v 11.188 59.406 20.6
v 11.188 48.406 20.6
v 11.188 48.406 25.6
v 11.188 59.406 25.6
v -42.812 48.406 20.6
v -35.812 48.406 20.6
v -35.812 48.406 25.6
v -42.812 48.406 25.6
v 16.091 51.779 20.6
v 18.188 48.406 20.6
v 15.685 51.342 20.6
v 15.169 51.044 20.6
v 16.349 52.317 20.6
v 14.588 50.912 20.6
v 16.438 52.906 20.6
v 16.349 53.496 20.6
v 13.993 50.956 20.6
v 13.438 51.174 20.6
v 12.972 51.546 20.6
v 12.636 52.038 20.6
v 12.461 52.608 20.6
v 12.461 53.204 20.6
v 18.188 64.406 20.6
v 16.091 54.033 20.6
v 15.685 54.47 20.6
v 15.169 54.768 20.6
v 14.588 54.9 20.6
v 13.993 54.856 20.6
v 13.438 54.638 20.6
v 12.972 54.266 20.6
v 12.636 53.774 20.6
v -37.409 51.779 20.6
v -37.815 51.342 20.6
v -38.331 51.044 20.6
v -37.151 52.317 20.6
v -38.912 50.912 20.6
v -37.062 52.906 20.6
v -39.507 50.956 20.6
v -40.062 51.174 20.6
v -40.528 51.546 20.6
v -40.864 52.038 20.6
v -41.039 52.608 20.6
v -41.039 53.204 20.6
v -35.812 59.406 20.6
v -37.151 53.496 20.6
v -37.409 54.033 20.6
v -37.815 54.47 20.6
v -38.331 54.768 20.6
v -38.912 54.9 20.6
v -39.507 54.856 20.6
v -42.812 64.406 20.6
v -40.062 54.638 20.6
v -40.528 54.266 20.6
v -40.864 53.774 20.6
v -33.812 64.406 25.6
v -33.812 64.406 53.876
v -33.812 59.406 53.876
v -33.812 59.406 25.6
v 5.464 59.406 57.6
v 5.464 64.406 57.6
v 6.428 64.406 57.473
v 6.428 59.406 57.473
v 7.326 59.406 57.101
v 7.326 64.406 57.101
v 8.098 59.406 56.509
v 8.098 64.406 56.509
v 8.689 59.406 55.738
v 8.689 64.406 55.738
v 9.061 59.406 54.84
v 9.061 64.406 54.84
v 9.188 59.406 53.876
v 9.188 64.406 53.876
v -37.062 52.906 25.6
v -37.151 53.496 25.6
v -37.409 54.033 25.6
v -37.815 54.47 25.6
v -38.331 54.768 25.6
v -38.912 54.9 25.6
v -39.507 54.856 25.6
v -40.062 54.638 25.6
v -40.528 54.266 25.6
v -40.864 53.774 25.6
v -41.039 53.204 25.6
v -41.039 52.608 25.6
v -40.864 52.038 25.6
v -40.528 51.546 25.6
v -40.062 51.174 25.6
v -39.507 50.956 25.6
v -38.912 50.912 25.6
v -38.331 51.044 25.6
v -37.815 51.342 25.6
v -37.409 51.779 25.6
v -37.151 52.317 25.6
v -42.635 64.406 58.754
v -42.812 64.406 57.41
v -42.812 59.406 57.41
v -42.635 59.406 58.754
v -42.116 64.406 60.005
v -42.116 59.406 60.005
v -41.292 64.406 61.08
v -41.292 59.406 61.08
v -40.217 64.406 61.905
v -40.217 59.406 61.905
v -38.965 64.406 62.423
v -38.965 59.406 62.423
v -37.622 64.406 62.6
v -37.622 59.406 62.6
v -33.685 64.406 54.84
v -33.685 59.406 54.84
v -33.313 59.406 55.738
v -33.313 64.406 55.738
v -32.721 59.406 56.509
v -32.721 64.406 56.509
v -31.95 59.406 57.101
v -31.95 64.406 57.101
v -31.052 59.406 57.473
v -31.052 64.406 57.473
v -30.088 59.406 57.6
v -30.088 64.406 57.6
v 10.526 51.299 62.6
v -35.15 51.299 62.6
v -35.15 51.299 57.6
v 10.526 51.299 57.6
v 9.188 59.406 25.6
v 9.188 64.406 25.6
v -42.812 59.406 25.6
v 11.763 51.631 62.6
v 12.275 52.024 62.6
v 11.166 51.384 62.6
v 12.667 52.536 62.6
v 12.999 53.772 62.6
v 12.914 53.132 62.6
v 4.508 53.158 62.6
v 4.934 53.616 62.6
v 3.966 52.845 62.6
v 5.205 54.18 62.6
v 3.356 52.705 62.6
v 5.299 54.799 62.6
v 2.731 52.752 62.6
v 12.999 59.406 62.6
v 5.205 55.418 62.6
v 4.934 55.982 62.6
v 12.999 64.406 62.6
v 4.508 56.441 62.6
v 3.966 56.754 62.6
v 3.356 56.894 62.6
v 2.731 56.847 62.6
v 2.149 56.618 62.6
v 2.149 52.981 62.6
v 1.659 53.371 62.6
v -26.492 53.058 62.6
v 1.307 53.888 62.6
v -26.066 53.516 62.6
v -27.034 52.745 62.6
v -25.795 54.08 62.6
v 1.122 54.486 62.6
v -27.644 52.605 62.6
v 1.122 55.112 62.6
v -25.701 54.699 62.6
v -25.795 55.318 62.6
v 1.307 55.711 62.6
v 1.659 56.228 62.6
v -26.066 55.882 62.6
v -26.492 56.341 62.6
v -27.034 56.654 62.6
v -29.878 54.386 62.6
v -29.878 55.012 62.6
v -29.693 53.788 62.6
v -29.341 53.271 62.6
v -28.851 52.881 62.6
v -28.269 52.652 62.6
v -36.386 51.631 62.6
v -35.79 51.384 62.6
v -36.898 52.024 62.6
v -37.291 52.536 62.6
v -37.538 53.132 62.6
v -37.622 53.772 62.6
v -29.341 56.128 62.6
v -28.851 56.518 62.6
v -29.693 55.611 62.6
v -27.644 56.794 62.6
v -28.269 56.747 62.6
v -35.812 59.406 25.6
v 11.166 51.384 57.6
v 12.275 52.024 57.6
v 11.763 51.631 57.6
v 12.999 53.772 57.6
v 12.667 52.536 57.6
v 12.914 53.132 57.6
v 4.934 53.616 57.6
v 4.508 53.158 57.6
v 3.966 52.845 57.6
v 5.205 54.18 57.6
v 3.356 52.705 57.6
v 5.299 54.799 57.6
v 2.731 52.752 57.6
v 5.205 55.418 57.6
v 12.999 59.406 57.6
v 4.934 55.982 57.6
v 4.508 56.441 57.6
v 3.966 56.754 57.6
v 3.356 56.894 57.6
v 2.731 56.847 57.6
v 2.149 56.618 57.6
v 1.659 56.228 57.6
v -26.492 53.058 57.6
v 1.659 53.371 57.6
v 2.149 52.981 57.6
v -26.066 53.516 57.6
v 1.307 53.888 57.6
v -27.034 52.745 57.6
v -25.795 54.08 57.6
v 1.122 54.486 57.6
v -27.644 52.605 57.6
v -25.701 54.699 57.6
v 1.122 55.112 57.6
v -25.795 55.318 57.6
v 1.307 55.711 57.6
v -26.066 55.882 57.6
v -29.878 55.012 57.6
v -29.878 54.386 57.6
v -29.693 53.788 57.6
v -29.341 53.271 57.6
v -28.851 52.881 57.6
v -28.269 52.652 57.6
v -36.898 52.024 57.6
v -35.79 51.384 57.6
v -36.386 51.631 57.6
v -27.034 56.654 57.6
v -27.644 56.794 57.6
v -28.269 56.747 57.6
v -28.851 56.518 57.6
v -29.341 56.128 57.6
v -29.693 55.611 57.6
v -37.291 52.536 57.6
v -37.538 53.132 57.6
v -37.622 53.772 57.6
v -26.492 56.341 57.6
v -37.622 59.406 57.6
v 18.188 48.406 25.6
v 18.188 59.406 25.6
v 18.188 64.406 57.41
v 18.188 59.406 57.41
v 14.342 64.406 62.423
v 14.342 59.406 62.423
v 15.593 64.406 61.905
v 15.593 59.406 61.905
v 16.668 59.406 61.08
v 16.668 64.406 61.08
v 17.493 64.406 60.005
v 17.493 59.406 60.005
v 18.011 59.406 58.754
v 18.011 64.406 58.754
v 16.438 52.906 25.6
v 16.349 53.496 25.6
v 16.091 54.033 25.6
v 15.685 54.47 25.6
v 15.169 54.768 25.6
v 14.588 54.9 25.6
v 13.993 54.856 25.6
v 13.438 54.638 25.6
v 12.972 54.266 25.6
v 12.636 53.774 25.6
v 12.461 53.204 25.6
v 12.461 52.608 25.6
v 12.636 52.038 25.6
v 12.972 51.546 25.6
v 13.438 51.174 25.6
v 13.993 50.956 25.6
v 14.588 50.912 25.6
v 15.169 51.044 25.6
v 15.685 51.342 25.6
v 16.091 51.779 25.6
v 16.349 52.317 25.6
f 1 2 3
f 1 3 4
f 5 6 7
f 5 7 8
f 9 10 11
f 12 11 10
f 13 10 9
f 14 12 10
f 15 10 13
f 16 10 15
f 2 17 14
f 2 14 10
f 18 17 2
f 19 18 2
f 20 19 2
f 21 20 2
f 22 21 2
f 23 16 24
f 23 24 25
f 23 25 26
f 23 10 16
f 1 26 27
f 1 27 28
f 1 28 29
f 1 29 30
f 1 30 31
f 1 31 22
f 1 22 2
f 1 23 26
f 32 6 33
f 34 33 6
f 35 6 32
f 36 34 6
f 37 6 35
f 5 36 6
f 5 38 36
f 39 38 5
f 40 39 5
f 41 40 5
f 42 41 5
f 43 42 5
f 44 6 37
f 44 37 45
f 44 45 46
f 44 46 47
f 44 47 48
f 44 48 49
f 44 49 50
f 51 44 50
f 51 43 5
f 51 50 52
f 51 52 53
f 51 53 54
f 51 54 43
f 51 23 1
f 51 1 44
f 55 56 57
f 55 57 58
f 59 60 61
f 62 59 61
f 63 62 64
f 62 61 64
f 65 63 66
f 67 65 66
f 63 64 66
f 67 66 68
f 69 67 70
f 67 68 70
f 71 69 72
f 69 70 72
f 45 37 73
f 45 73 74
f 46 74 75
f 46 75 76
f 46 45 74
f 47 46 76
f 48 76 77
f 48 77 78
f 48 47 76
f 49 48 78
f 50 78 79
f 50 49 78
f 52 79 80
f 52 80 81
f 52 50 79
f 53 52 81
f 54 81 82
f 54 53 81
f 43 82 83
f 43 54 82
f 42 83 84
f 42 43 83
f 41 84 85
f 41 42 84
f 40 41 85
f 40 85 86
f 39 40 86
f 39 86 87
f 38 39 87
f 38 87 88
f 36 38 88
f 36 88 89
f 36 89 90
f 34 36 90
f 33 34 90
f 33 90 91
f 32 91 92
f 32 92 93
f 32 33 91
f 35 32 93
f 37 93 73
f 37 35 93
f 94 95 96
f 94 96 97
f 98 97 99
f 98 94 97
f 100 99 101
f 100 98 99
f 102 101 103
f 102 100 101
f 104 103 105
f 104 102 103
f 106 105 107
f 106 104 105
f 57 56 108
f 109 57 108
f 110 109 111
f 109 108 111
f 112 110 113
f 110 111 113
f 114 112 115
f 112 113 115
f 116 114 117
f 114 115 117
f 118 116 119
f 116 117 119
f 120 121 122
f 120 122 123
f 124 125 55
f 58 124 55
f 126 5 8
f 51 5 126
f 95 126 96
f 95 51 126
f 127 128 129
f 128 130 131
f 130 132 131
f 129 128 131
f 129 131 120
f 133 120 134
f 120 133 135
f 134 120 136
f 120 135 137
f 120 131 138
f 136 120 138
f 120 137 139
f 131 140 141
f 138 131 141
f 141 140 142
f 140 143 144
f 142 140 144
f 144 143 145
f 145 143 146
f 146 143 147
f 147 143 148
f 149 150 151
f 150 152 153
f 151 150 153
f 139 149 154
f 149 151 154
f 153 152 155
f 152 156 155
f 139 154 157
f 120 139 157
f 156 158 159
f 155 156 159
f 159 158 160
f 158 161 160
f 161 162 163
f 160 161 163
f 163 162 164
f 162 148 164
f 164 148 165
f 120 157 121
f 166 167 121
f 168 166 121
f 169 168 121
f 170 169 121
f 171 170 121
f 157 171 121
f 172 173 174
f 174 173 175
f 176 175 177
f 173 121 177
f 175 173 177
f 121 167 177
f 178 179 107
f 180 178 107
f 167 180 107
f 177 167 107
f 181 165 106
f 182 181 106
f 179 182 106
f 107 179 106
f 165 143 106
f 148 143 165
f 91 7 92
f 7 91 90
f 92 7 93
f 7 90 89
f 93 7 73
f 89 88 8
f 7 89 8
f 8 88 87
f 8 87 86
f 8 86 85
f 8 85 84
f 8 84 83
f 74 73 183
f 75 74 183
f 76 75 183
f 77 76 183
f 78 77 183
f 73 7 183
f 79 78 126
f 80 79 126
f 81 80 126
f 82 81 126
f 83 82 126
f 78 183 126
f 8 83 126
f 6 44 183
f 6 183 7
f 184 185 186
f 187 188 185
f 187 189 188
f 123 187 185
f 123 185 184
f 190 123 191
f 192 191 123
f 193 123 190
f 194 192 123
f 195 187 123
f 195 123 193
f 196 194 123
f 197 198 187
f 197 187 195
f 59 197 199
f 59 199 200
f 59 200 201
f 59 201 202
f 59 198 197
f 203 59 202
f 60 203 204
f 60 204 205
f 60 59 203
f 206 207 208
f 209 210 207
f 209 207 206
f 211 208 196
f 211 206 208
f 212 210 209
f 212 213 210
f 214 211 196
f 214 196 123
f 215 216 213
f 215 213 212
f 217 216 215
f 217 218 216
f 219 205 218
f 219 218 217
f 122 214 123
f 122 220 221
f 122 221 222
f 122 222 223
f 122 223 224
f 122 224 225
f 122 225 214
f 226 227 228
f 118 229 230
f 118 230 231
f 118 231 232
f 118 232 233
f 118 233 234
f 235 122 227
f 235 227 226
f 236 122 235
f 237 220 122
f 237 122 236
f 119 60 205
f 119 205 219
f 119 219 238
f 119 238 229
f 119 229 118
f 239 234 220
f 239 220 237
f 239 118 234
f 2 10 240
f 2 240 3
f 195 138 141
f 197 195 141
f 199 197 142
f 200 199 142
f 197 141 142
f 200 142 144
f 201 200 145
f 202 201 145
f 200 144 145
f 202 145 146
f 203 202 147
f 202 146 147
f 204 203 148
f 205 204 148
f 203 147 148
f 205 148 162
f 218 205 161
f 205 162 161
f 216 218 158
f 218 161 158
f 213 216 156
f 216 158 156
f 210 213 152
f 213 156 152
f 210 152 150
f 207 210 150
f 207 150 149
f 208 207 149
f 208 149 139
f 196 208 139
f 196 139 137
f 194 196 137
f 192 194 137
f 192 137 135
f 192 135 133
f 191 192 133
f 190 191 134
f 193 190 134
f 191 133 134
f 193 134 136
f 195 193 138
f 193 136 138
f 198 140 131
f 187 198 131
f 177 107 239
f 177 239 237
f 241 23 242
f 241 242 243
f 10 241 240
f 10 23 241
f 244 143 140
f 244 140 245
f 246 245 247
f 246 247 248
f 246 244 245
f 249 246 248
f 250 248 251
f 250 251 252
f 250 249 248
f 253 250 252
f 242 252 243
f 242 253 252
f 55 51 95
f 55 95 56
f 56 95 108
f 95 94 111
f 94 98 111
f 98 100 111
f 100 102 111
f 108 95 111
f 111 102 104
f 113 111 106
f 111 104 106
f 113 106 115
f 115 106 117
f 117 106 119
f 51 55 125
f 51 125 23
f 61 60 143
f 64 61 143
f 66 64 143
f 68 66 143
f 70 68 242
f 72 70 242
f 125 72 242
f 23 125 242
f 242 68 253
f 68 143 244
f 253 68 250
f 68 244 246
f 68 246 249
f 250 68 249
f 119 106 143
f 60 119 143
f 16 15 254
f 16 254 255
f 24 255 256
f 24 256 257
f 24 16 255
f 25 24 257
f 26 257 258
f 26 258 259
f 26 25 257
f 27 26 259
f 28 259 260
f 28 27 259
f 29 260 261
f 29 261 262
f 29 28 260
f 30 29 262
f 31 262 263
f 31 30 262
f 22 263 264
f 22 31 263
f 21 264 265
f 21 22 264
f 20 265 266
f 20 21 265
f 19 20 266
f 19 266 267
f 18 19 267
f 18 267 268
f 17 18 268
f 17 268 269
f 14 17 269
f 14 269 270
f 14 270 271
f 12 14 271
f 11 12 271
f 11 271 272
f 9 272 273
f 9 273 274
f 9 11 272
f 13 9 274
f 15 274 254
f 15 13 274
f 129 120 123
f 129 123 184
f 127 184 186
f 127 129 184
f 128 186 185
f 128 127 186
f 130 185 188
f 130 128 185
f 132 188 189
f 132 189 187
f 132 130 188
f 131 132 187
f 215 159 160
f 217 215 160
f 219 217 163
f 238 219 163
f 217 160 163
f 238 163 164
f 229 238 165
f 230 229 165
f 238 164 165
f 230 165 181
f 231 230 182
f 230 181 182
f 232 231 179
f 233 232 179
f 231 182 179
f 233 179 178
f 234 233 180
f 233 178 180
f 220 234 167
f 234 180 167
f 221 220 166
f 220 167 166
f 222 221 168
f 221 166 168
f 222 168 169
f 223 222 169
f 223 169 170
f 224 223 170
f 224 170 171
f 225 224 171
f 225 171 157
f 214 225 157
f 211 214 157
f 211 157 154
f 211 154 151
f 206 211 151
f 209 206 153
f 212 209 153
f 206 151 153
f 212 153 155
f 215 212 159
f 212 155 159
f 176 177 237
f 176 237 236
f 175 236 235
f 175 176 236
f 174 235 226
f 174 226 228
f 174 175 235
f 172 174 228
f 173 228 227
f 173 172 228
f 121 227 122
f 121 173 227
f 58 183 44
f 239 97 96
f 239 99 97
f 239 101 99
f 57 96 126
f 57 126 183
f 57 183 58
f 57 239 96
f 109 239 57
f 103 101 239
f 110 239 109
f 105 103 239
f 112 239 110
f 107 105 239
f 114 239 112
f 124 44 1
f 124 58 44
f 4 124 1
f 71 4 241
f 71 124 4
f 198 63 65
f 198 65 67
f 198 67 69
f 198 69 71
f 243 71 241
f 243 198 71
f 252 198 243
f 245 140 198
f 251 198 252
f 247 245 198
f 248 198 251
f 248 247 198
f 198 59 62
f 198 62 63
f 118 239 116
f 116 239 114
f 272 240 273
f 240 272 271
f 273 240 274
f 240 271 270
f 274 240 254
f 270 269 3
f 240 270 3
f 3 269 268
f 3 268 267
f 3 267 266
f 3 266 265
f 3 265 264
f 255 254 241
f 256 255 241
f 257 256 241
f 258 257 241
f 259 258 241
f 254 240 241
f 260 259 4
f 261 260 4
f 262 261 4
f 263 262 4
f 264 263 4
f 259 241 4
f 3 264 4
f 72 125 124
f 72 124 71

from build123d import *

# Parameters (mm, degrees)
EXTRUDE010_DEPTH = 5
SKETCH010_R      = 2
EXTRUDE009_DEPTH = 5
SKETCH012_R      = 2.1
EXTRUDE011_DEPTH = 5


with BuildPart() as extrude010:
    # Sketch011 (on Face6 of Extrude009) → Extrude010 (new body)
    with BuildSketch(Plane(origin=(0, 64.406042, 20.6), x_dir=(-1, 0, 0), z_dir=(0, 1, 0))):
        with BuildLine():
            Line((-18.188271, 0), (-18.188271, 36.810456))
            ThreePointArc((-12.998727, 42), (-16.668289, 40.480018), (-18.188271, 36.810456))
            Line((-12.998727, 42), (37.622185, 42))
            ThreePointArc((42.811729, 36.810456), (41.291746, 40.480018), (37.622185, 42))
            Line((42.811729, 0), (42.811729, 36.810456))
            Line((-18.188271, 0), (42.811729, 0))
        make_face()
        with BuildLine():
            Line((-9.188271, 5), (-9.188271, 33.276052))
            ThreePointArc((-5.464323, 37), (-8.097552, 35.909281), (-9.188271, 33.276052))
            Line((-5.464323, 37), (30.08778, 37))
            ThreePointArc((33.811729, 33.276052), (32.721009, 35.909281), (30.08778, 37))
            Line((33.811729, 33.276052), (33.811729, 5))
            Line((-9.188271, 5), (33.811729, 5))
        make_face(mode=Mode.SUBTRACT)
    extrude(amount=-EXTRUDE010_DEPTH)


with BuildPart() as extrude009:
    # Sketch010 → Extrude009 (new body)
    with BuildSketch(Plane.XY):
        Polygon((11.188271, 48.406042), (11.188271, 59.406042), (-35.811729, 59.406042), (-35.811729, 48.406042), (-42.811729, 48.406042), (-42.811729, 64.406042), (18.188271, 64.406042), (18.188271, 48.406042), align=None)
        with Locations((-39.061729, 52.906042)):
            Circle(SKETCH010_R, mode=Mode.SUBTRACT)
        with Locations((14.438271, 52.906042)):
            Circle(SKETCH010_R, mode=Mode.SUBTRACT)
    extrude(amount=EXTRUDE009_DEPTH)


with BuildPart() as extrude009_1:
    # Extrude009 placement: moved
    add(extrude009.part.moved(Location((0, 0, 20.6))))


with BuildPart() as pcb_holder_fusion:
    # Sketch012 (on Face3 of Extrude010) → Extrude011 (new body)
    with BuildSketch(Plane.XY.offset(62.6)):
        with BuildLine():
            Line((-37.622185, 64.406042), (-37.622185, 58.771772))
            ThreePointArc((-37.622185, 58.771772), (-36.898048, 57.023553), (-35.149829, 56.299416))
            Line((-35.149829, 56.299416), (10.526371, 56.299416))
            ThreePointArc((10.526371, 56.299416), (12.274591, 57.023553), (12.998727, 58.771772))
            Line((12.998727, 64.406042), (12.998727, 58.771772))
            Line((-37.622185, 64.406042), (12.998727, 64.406042))
        make_face()
        with Locations((-27.801273, 59.699416)):
            Circle(SKETCH012_R, mode=Mode.SUBTRACT)
        with Locations((3.198727, 59.799416)):
            Circle(SKETCH012_R, mode=Mode.SUBTRACT)
    extrude(amount=-EXTRUDE011_DEPTH)


with BuildPart() as pcb_holder_fusion_1:
    # Extrude011 placement: moved
    add(pcb_holder_fusion.part.moved(Location((0, -5, 0))))

    # Fusion012: union Extrude010, Extrude009
    add(extrude010.part)
    add(extrude009_1.part)


solid = pcb_holder_fusion_1.part
